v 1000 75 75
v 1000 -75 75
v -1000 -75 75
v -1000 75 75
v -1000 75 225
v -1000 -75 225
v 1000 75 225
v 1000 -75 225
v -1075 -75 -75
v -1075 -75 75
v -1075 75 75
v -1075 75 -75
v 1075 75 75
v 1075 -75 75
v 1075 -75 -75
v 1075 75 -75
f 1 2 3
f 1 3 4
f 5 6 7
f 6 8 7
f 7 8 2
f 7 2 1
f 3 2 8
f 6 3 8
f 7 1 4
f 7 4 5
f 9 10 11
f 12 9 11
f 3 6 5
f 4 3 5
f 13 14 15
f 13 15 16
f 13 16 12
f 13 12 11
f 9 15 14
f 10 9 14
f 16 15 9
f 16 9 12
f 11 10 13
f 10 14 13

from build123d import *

# Parameters (mm, degrees)
F0_W     = 150
F0_H     = 150
F1_DEPTH = 1075
F2_DEPTH = 1000


with BuildPart() as f1:
    # F0 (on Right) → F1 (new body, symmetric)
    with BuildSketch(Plane.YZ):
        Rectangle(F0_W, F0_H)
    extrude(amount=F1_DEPTH, both=True)


with BuildPart() as f2:
    # F0 (on Right) → F2 (new body, symmetric)
    with BuildSketch(Plane.YZ):
        with Locations((0, 150)):
            Rectangle(F0_W, F0_H)
    extrude(amount=F2_DEPTH, both=True)


solid = Compound([f1.part, f2.part])
